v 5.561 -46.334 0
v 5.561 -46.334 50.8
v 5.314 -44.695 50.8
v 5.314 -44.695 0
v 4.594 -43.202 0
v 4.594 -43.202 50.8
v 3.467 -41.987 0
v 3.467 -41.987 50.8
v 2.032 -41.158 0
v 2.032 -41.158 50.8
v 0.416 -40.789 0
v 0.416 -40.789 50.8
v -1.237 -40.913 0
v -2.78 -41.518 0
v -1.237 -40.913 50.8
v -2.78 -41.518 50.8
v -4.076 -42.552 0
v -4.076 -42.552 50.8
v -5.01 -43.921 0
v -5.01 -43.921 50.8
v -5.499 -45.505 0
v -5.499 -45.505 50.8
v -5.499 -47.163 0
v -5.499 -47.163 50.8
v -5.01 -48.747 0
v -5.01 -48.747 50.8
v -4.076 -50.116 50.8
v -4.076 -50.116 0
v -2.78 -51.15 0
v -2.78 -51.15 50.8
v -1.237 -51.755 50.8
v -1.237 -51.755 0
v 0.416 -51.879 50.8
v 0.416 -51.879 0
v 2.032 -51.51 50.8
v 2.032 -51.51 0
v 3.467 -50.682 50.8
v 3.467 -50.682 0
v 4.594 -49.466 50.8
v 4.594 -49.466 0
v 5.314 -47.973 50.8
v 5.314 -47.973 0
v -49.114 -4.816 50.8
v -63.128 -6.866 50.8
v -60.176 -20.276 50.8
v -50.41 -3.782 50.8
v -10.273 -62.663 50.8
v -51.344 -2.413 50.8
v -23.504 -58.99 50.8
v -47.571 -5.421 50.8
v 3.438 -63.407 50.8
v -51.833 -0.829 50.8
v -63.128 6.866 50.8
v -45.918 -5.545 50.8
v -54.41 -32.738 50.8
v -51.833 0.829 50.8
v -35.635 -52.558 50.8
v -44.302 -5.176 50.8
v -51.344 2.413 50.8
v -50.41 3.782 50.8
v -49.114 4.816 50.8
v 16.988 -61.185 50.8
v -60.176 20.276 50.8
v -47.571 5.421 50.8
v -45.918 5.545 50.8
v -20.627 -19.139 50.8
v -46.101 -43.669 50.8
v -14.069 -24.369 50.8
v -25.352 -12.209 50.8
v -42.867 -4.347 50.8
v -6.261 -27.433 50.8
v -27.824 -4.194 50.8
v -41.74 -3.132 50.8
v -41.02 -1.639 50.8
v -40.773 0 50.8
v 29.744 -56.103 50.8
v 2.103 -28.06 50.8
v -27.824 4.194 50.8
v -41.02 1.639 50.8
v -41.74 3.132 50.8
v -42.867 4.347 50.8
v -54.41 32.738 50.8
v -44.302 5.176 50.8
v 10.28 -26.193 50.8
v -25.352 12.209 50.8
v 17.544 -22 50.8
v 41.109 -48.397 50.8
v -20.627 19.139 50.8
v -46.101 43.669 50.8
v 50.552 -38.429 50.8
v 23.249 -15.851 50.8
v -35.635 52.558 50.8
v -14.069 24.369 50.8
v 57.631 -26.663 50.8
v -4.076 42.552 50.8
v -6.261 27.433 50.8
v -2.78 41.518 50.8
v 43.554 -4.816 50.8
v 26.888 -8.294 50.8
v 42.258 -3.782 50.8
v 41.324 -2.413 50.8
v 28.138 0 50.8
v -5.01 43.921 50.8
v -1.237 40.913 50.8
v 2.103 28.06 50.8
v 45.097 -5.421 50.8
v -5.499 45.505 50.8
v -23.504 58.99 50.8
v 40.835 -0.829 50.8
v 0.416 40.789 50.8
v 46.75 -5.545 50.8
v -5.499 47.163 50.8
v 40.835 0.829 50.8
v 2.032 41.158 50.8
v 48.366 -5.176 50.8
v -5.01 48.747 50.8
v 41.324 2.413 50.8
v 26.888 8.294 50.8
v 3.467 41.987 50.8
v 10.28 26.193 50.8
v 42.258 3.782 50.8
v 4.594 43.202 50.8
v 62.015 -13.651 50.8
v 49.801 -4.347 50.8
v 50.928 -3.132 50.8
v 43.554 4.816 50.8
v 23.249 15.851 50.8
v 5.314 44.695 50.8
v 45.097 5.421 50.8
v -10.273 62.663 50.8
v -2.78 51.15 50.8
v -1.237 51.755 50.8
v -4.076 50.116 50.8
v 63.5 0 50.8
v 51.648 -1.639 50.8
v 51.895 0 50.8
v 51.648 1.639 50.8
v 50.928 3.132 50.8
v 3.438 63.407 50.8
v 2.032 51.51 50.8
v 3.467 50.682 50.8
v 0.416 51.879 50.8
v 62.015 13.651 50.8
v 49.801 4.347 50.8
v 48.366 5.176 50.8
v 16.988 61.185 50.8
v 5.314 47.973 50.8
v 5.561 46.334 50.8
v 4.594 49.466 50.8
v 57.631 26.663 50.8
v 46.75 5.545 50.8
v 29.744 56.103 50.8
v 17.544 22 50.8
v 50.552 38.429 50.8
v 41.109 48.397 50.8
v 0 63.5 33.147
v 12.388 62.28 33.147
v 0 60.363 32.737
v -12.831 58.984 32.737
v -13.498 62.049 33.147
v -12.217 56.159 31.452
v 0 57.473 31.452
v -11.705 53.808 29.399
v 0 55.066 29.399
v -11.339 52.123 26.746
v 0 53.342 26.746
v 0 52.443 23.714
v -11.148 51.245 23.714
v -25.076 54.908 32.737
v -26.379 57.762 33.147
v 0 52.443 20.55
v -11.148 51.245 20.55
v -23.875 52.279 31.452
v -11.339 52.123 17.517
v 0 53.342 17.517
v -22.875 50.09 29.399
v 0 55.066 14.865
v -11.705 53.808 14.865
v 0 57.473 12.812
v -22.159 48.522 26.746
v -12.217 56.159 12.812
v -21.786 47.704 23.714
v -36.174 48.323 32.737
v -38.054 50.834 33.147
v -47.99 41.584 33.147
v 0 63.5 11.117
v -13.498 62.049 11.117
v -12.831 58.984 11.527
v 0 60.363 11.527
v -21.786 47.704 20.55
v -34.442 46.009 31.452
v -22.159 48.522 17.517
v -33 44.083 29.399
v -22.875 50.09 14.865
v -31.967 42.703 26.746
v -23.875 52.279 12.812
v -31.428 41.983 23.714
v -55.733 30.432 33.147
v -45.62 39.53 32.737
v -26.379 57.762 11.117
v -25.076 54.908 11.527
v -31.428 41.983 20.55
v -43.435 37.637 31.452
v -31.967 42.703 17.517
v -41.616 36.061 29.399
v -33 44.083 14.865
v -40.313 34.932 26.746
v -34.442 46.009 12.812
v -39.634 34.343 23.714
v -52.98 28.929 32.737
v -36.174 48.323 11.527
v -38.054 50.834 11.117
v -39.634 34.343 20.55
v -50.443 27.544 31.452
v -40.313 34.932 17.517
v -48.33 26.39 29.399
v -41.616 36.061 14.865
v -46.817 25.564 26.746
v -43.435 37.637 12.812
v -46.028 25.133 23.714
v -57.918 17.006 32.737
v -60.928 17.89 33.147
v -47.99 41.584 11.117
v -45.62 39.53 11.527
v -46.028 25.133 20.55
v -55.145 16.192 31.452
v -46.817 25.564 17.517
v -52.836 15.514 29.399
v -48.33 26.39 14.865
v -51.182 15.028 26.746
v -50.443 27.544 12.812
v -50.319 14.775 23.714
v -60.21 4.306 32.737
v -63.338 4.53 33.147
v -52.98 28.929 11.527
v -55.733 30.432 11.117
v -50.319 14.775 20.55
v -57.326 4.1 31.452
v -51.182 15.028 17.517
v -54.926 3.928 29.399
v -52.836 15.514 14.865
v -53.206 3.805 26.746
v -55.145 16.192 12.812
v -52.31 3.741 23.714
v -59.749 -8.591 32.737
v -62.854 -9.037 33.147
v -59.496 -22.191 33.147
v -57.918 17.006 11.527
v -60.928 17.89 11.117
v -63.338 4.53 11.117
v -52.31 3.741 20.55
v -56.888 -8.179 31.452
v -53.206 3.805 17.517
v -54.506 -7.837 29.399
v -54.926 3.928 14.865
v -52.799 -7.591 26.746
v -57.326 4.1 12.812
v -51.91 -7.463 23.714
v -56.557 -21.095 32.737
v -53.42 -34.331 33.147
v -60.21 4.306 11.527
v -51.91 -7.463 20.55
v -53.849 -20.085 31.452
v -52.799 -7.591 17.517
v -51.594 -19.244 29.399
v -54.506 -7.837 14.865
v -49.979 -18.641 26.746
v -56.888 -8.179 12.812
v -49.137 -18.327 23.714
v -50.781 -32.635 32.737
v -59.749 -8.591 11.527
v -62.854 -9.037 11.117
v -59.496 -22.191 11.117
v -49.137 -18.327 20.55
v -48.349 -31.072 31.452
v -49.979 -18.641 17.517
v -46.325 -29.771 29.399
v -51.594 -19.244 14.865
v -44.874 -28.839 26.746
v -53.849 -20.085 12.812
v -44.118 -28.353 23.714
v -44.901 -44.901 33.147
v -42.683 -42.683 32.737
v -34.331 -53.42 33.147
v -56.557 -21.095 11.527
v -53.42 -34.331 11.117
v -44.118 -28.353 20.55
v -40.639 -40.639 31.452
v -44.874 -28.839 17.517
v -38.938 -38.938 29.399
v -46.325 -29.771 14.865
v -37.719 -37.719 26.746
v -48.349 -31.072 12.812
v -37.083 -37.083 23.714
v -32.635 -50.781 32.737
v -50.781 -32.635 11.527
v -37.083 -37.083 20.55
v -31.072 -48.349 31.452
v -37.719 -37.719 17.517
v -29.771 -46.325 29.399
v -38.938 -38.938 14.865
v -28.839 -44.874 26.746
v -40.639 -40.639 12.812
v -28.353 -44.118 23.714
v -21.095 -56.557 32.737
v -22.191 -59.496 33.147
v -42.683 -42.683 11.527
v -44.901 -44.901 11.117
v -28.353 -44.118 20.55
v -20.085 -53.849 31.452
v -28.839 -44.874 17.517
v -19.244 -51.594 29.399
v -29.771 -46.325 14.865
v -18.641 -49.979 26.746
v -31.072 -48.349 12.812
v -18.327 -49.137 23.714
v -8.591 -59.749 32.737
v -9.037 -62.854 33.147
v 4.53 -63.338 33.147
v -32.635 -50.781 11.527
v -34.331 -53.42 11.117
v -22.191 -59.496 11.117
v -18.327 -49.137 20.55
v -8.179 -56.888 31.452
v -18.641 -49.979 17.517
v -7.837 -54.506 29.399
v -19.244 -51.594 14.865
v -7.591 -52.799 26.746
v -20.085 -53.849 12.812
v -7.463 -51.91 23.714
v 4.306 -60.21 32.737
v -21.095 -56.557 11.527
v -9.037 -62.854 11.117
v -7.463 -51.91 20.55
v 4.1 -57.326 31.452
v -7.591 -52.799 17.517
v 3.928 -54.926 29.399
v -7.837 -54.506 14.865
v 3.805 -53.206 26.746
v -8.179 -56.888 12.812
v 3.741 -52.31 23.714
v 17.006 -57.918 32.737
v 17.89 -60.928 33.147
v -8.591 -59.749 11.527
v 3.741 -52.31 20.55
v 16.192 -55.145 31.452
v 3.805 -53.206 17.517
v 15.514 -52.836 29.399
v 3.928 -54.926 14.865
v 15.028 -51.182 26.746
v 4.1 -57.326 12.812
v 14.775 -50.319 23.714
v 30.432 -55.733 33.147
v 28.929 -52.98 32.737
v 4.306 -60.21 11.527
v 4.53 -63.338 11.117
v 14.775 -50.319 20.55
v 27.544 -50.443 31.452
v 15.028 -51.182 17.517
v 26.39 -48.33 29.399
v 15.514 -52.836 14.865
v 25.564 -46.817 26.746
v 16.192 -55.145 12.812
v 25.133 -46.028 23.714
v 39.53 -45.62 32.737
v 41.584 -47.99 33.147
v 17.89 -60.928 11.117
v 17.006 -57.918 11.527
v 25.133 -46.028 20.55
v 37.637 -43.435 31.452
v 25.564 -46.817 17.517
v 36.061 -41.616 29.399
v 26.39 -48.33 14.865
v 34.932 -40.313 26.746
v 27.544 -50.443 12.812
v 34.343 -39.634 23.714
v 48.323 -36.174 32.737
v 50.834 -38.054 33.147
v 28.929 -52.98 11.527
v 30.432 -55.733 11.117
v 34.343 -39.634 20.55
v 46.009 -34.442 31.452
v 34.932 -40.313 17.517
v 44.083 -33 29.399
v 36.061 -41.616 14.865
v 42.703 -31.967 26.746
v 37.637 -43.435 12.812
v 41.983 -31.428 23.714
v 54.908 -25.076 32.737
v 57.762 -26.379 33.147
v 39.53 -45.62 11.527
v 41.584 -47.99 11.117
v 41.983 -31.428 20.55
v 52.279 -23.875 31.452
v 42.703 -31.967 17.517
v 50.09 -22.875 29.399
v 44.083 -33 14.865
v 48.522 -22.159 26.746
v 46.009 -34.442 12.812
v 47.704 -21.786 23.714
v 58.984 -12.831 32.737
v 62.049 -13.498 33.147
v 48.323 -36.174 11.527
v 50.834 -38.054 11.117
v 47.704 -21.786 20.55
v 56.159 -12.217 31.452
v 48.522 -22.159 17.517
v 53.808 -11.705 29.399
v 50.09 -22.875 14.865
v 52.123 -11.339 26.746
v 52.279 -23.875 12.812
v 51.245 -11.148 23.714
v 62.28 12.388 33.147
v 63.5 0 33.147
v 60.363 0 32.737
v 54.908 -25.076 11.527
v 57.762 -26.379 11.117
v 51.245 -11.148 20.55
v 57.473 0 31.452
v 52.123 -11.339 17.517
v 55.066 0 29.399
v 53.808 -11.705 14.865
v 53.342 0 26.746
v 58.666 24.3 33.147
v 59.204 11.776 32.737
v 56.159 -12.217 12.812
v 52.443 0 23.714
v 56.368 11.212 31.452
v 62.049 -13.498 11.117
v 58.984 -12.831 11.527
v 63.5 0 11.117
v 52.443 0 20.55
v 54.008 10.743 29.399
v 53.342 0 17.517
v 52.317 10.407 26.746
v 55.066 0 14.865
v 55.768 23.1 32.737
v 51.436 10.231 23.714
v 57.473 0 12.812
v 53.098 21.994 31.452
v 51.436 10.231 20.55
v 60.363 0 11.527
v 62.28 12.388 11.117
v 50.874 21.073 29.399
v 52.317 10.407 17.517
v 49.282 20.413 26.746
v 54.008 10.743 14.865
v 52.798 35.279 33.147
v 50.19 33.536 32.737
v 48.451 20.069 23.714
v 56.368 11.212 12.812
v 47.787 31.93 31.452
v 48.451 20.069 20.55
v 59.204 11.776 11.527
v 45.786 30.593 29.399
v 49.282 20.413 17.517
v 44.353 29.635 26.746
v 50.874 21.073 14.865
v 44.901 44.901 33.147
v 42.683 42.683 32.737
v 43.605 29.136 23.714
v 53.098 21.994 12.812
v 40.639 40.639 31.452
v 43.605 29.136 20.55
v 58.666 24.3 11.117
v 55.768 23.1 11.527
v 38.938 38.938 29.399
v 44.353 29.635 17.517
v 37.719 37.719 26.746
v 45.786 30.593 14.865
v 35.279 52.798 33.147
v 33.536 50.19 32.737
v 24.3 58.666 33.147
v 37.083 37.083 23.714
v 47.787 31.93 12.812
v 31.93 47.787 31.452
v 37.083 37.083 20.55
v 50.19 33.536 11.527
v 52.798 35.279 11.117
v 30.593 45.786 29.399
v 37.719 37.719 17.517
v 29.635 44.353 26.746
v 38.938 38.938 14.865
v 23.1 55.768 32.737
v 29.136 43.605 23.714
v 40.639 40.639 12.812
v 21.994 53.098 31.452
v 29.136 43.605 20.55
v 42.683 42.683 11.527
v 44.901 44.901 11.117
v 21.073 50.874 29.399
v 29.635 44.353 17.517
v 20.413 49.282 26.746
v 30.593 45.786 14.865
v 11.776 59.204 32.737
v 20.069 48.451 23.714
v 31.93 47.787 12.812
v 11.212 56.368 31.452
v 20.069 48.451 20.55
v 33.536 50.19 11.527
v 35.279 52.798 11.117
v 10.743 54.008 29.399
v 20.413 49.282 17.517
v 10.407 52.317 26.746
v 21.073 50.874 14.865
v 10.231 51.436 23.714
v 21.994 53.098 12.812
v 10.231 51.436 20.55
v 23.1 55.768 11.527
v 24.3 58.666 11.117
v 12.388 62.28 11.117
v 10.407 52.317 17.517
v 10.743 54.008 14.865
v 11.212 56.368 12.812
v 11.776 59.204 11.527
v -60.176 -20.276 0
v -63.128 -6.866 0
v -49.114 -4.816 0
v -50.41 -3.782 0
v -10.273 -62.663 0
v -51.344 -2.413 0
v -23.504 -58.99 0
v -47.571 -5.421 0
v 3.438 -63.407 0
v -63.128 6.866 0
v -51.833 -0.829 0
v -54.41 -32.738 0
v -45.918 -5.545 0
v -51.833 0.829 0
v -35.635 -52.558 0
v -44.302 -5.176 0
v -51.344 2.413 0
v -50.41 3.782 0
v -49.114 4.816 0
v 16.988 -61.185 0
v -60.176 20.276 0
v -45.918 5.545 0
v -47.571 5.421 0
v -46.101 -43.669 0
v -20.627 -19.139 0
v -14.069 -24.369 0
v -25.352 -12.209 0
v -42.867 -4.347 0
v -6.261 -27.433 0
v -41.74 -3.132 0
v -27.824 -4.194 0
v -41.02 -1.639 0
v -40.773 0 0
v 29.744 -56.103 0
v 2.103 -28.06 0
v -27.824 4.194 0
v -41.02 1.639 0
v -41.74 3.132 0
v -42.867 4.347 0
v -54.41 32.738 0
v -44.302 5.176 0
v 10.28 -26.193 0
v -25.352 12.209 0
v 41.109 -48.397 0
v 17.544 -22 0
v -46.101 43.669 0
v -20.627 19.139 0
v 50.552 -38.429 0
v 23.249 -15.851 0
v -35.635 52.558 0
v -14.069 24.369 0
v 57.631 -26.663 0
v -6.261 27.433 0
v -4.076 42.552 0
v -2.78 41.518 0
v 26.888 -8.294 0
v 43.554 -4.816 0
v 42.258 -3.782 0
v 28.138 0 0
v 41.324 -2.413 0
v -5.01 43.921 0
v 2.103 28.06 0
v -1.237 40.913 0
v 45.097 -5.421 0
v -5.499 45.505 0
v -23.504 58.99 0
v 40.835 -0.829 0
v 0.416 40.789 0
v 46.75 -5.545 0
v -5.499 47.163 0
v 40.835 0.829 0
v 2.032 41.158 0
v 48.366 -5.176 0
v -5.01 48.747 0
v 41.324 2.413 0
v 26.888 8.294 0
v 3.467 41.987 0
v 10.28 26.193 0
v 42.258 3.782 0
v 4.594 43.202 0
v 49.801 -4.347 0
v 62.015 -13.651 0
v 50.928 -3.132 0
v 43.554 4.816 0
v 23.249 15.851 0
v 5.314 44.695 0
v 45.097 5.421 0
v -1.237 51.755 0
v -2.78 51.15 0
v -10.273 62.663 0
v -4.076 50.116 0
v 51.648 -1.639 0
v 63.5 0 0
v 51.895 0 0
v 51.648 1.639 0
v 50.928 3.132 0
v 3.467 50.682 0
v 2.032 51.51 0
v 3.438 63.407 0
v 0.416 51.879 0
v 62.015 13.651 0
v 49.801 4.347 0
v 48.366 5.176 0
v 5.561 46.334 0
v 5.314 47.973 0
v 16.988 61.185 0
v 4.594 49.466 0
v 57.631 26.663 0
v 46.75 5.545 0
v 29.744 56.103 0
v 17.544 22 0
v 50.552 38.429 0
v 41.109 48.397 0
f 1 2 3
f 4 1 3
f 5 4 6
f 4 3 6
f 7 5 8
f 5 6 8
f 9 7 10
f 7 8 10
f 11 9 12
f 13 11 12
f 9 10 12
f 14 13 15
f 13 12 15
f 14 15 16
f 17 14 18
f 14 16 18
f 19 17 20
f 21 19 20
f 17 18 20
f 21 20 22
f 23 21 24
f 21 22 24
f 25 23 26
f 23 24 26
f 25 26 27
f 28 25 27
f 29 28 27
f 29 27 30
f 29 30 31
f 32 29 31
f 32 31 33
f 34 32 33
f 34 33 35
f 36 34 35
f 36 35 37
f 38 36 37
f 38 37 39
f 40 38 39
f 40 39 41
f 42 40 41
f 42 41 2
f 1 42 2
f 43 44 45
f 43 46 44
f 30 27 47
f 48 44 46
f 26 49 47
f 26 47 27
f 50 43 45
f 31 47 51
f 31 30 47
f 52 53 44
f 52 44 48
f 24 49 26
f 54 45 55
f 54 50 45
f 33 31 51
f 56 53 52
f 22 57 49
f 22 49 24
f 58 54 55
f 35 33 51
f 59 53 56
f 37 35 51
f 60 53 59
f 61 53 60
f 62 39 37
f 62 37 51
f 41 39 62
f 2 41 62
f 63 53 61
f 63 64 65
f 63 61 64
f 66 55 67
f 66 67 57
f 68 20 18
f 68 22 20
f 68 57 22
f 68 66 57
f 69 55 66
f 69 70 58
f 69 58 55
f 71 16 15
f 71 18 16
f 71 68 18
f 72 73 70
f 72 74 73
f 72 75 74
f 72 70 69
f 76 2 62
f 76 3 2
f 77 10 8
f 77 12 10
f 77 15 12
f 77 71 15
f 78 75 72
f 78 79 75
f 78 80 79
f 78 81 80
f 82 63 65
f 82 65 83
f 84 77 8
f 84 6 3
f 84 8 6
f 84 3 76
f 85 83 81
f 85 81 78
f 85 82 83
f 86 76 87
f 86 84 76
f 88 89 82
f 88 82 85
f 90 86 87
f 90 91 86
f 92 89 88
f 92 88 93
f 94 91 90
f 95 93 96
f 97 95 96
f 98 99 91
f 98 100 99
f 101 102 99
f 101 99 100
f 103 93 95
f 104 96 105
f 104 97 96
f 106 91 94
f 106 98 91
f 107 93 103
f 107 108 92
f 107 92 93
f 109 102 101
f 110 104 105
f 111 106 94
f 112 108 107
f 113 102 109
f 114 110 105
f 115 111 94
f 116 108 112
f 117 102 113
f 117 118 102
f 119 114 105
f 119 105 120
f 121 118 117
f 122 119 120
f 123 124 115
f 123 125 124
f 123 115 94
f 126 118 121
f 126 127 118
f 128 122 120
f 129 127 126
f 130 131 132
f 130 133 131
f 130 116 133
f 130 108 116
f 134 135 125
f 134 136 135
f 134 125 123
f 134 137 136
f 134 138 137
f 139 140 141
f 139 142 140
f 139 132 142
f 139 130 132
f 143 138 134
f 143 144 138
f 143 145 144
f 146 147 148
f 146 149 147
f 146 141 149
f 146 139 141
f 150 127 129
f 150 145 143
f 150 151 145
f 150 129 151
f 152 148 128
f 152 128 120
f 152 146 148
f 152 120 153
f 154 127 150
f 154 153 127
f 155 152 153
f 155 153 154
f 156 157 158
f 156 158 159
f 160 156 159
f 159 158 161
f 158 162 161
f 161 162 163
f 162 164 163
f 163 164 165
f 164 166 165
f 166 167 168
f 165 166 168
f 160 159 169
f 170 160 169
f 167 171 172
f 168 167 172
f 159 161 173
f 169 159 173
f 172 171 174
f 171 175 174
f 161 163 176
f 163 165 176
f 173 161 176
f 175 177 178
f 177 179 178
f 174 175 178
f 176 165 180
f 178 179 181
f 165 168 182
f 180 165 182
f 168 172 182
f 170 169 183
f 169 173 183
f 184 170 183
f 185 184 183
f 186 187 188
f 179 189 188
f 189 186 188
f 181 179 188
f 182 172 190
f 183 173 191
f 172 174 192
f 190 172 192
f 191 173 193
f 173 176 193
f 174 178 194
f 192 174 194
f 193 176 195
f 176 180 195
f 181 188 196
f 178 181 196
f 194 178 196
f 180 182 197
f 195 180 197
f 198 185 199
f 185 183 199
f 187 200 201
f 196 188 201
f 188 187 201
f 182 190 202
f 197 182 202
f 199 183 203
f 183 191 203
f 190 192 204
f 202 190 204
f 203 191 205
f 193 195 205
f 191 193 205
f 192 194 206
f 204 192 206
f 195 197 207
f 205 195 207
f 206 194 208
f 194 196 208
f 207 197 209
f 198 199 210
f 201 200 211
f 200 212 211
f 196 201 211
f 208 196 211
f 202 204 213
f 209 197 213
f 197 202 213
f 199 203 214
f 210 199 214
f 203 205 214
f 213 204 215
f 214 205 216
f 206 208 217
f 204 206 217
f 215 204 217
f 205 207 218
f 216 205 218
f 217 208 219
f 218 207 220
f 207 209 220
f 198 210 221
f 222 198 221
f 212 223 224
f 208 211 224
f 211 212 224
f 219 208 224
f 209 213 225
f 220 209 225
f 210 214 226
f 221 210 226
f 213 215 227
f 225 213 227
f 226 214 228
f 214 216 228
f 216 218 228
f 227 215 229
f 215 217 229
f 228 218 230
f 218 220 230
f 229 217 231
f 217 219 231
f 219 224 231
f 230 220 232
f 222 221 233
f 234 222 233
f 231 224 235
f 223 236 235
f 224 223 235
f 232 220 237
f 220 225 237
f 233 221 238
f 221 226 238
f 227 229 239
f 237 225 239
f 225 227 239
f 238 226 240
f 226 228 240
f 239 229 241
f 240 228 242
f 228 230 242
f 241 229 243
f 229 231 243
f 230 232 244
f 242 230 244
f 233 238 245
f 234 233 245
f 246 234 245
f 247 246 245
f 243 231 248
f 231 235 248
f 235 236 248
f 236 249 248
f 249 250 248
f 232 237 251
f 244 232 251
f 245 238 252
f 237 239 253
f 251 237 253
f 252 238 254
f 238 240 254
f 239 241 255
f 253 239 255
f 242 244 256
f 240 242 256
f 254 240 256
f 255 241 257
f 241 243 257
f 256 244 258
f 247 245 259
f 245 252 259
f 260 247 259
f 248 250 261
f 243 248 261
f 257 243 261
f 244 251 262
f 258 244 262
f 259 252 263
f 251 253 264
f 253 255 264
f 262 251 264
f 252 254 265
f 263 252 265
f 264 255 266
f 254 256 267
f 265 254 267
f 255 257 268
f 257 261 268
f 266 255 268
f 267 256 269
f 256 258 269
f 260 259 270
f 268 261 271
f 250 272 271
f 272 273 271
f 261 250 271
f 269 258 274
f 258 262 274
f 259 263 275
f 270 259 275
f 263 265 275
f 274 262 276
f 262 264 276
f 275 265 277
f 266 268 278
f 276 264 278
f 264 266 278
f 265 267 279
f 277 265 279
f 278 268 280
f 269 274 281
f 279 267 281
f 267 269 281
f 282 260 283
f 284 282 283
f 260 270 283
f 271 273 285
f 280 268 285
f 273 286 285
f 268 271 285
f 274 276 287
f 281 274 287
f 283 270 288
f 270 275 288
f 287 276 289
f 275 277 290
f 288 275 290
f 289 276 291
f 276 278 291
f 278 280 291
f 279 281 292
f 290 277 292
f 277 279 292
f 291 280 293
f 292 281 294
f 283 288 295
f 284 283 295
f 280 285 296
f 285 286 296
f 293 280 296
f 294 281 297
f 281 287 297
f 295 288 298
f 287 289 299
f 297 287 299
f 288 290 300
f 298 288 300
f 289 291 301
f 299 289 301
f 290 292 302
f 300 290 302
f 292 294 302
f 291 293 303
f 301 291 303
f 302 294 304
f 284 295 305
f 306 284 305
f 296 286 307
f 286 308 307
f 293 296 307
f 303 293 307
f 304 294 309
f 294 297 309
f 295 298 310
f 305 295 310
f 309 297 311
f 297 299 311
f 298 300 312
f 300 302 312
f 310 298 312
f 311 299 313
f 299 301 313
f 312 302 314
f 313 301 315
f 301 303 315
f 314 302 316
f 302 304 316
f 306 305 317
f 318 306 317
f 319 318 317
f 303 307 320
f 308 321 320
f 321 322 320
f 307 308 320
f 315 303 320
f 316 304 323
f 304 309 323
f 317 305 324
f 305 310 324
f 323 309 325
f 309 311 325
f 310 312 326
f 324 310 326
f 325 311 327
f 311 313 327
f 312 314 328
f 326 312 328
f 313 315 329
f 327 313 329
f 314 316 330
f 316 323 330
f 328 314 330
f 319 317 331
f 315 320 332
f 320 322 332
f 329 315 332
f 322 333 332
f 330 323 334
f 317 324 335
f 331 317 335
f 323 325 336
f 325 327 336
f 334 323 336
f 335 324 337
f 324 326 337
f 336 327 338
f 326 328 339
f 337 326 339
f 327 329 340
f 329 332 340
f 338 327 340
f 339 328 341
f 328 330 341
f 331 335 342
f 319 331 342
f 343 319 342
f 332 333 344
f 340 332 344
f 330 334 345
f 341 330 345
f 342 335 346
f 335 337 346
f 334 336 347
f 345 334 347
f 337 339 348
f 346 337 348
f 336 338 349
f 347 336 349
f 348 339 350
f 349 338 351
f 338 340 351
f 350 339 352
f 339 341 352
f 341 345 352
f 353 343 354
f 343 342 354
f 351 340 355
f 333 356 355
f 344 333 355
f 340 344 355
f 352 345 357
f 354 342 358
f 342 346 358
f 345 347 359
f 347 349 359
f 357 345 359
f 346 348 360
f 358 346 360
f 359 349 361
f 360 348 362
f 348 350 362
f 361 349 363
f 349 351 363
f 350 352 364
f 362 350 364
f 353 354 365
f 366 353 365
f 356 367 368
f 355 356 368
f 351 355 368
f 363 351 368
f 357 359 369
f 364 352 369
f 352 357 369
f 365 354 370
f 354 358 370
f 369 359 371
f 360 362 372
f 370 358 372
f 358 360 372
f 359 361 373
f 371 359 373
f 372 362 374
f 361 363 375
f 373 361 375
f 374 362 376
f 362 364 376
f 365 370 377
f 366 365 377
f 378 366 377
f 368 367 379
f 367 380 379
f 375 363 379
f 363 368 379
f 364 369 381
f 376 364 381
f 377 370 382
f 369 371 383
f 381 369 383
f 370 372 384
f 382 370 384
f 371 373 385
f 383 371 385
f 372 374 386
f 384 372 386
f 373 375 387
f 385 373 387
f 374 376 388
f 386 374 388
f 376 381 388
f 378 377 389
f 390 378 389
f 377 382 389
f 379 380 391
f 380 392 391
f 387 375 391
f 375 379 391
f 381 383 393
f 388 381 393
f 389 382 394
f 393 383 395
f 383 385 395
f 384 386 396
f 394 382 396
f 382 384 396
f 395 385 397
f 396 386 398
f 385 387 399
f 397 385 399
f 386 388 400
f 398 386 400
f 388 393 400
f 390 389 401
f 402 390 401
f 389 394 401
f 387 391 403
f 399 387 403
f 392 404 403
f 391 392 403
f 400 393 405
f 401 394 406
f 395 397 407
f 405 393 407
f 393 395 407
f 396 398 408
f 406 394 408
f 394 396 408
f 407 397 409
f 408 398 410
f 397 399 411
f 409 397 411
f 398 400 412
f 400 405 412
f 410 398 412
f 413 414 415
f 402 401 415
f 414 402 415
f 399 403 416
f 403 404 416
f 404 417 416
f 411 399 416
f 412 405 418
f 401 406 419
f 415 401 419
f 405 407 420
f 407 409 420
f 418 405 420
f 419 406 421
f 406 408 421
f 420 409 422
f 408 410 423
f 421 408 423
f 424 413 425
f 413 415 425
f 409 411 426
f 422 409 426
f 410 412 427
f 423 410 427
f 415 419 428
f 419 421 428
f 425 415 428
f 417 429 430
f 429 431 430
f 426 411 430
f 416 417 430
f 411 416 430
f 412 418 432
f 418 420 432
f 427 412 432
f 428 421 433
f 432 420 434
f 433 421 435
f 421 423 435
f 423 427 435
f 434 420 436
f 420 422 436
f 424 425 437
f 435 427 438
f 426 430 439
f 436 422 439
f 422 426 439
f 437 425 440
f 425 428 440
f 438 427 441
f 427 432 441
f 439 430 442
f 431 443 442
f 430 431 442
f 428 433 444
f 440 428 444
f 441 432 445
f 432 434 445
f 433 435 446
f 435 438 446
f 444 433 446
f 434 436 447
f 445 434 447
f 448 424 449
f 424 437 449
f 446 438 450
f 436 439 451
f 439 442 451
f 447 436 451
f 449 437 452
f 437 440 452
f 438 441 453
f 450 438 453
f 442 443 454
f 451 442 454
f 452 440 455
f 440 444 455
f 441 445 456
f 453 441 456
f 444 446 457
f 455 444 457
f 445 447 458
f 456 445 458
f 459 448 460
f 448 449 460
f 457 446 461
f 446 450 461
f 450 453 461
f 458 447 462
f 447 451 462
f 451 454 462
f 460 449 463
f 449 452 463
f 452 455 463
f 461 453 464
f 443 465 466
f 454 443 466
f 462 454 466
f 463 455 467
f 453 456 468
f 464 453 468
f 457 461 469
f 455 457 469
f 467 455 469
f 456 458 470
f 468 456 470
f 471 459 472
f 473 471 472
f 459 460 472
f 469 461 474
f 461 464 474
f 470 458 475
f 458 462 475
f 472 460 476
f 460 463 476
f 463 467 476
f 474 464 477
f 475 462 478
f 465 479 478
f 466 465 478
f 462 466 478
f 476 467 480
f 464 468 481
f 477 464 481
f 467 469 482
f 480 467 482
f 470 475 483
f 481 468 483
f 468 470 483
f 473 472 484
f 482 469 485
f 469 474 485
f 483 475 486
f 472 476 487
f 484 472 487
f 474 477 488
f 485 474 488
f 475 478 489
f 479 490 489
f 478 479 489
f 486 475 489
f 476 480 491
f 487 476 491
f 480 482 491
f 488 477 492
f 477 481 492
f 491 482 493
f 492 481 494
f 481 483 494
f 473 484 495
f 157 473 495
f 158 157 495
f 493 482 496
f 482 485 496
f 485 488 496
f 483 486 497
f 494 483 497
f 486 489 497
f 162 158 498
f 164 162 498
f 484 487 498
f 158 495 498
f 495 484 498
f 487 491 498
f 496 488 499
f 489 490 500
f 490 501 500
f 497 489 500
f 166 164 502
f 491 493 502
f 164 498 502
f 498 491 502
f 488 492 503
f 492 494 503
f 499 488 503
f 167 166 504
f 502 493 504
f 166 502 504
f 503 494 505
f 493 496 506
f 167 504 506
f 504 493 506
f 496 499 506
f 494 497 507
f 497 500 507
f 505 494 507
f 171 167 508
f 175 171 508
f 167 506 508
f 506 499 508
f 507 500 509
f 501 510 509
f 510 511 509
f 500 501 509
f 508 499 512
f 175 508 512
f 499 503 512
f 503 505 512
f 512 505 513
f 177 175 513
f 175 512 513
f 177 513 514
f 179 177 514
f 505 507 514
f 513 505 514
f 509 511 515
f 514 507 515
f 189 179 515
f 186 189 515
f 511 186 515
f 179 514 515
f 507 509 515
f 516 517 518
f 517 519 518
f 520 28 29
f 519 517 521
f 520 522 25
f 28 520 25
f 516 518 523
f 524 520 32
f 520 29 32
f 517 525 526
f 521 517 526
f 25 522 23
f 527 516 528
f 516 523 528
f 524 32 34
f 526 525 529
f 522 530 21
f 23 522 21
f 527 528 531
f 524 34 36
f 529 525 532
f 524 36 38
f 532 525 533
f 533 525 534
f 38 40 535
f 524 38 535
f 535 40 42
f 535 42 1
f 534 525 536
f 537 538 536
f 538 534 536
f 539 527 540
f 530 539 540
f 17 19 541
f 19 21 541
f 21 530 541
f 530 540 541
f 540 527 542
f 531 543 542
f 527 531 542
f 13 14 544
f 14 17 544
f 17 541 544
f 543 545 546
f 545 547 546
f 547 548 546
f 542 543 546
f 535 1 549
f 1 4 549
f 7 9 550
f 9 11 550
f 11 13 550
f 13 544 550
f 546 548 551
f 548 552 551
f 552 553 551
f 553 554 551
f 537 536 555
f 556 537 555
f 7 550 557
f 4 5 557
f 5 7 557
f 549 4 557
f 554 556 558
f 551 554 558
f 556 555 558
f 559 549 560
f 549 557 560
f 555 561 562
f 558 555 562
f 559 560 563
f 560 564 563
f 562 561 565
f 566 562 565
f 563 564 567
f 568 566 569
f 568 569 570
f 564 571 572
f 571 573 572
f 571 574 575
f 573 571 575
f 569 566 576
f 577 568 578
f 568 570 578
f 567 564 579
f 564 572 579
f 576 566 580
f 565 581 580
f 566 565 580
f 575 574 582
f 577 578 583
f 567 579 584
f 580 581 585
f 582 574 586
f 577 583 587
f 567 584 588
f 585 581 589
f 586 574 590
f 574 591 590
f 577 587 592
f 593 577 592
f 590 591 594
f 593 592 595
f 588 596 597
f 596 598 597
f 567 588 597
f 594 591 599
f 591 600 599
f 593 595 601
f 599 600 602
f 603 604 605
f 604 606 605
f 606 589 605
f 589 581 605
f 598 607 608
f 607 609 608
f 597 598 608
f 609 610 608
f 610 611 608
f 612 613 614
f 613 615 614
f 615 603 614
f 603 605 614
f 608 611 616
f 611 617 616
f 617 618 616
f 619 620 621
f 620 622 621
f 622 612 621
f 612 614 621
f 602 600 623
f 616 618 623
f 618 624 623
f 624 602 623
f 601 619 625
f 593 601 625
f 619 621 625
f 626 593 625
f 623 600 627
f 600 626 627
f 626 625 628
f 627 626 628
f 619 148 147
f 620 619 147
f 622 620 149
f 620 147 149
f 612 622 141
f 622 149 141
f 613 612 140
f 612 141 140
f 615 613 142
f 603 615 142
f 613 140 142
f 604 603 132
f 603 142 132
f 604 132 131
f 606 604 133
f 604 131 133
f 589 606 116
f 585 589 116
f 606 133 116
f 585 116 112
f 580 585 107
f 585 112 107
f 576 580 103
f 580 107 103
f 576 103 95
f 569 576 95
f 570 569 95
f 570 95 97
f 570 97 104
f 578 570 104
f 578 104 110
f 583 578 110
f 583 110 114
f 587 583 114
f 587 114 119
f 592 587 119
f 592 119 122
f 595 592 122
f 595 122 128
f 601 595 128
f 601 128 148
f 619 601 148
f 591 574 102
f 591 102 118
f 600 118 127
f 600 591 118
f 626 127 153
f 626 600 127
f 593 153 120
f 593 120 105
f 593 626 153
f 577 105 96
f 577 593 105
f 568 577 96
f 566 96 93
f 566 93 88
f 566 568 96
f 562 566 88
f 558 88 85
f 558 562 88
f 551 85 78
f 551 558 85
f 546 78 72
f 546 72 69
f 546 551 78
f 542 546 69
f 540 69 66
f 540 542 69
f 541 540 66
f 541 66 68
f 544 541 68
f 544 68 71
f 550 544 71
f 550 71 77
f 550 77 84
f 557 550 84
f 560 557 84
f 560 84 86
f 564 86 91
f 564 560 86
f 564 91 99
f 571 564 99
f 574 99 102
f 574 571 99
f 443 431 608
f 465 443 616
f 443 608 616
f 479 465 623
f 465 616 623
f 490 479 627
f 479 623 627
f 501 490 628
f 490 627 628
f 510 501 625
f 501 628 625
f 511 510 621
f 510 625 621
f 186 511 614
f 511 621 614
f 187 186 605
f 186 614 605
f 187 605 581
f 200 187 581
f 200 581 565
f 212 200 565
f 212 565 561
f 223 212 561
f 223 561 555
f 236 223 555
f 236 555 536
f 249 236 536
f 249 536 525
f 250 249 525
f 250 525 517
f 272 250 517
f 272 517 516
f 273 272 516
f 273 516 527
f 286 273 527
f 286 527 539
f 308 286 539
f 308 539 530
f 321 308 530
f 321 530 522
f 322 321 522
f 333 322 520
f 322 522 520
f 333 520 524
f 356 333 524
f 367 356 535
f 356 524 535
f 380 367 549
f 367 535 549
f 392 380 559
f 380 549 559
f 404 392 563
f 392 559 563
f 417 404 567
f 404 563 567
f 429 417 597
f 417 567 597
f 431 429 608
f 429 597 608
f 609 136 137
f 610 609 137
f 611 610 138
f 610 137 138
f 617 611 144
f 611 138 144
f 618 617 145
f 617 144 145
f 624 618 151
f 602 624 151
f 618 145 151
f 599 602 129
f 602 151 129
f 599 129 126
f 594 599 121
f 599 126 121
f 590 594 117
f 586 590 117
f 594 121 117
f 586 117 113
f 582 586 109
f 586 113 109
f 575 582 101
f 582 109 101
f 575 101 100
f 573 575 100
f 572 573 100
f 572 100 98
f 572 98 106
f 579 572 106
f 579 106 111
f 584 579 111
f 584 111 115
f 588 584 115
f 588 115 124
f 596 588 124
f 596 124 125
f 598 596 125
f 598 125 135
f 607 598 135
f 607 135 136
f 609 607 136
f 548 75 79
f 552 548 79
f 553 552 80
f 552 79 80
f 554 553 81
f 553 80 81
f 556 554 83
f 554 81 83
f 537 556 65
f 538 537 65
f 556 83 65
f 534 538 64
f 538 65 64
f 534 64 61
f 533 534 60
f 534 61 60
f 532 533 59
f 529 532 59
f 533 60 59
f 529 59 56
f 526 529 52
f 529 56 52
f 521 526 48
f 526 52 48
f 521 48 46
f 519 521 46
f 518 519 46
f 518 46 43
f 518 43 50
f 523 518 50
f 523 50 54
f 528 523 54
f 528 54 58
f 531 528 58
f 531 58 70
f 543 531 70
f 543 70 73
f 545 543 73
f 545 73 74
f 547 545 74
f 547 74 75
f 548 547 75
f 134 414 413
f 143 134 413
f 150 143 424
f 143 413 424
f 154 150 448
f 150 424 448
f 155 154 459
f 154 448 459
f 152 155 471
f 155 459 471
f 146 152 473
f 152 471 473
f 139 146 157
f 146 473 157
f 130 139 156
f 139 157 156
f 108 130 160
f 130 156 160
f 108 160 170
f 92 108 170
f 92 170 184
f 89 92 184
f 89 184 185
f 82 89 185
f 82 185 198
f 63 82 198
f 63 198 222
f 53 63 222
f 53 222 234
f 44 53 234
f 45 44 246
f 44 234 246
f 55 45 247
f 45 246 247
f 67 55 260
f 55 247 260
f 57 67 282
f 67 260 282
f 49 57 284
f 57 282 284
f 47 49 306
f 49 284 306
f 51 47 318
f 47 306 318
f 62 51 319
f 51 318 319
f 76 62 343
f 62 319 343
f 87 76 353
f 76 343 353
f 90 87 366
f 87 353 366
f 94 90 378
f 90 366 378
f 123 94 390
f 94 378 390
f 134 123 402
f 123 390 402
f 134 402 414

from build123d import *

# Parameters (mm, degrees)
F0_R     = 63.5
F0_R_2   = 28.1384603026
F1_DEPTH = 50.8
F2_R     = 11.0160883331
F4_R     = 5.5606419872
F5_DEPTH = 50.801


with BuildPart() as f1:
    # F0 (on Top) → F1 (new body)
    with BuildSketch(Plane.XY):
        Circle(F0_R)
        Circle(F0_R_2, mode=Mode.SUBTRACT)
    extrude(amount=F1_DEPTH)

    # F3: sweep along a path in F3_path
    with BuildLine(Plane(origin=(63.5, 0, 50.8), x_dir=(0, 1, 0), z_dir=(0, 0, 1))) as f3_path:
        CenterArc((0, 63.5), 63.5, 0, 360)
    # F2 (on Right) → F3 (sweep, cut)
    with BuildSketch(Plane.YZ):
        with Locations((63.3453205228, 22.1318639815)):
            Circle(F2_R)
    sweep(path=f3_path.line, mode=Mode.SUBTRACT)

    # F4 (on face) → F5 (cut, through all)
    with BuildSketch(Plane.XY.offset(50.8)):
        with Locations((0, -46.334028244)):
            Circle(F4_R)
        with Locations((46.334028244, 0)):
            Circle(F4_R)
        with Locations((0, 46.334028244)):
            Circle(F4_R)
        with Locations((-46.334028244, 0)):
            Circle(F4_R)
    extrude(amount=-F5_DEPTH, mode=Mode.SUBTRACT)


solid = f1.part
